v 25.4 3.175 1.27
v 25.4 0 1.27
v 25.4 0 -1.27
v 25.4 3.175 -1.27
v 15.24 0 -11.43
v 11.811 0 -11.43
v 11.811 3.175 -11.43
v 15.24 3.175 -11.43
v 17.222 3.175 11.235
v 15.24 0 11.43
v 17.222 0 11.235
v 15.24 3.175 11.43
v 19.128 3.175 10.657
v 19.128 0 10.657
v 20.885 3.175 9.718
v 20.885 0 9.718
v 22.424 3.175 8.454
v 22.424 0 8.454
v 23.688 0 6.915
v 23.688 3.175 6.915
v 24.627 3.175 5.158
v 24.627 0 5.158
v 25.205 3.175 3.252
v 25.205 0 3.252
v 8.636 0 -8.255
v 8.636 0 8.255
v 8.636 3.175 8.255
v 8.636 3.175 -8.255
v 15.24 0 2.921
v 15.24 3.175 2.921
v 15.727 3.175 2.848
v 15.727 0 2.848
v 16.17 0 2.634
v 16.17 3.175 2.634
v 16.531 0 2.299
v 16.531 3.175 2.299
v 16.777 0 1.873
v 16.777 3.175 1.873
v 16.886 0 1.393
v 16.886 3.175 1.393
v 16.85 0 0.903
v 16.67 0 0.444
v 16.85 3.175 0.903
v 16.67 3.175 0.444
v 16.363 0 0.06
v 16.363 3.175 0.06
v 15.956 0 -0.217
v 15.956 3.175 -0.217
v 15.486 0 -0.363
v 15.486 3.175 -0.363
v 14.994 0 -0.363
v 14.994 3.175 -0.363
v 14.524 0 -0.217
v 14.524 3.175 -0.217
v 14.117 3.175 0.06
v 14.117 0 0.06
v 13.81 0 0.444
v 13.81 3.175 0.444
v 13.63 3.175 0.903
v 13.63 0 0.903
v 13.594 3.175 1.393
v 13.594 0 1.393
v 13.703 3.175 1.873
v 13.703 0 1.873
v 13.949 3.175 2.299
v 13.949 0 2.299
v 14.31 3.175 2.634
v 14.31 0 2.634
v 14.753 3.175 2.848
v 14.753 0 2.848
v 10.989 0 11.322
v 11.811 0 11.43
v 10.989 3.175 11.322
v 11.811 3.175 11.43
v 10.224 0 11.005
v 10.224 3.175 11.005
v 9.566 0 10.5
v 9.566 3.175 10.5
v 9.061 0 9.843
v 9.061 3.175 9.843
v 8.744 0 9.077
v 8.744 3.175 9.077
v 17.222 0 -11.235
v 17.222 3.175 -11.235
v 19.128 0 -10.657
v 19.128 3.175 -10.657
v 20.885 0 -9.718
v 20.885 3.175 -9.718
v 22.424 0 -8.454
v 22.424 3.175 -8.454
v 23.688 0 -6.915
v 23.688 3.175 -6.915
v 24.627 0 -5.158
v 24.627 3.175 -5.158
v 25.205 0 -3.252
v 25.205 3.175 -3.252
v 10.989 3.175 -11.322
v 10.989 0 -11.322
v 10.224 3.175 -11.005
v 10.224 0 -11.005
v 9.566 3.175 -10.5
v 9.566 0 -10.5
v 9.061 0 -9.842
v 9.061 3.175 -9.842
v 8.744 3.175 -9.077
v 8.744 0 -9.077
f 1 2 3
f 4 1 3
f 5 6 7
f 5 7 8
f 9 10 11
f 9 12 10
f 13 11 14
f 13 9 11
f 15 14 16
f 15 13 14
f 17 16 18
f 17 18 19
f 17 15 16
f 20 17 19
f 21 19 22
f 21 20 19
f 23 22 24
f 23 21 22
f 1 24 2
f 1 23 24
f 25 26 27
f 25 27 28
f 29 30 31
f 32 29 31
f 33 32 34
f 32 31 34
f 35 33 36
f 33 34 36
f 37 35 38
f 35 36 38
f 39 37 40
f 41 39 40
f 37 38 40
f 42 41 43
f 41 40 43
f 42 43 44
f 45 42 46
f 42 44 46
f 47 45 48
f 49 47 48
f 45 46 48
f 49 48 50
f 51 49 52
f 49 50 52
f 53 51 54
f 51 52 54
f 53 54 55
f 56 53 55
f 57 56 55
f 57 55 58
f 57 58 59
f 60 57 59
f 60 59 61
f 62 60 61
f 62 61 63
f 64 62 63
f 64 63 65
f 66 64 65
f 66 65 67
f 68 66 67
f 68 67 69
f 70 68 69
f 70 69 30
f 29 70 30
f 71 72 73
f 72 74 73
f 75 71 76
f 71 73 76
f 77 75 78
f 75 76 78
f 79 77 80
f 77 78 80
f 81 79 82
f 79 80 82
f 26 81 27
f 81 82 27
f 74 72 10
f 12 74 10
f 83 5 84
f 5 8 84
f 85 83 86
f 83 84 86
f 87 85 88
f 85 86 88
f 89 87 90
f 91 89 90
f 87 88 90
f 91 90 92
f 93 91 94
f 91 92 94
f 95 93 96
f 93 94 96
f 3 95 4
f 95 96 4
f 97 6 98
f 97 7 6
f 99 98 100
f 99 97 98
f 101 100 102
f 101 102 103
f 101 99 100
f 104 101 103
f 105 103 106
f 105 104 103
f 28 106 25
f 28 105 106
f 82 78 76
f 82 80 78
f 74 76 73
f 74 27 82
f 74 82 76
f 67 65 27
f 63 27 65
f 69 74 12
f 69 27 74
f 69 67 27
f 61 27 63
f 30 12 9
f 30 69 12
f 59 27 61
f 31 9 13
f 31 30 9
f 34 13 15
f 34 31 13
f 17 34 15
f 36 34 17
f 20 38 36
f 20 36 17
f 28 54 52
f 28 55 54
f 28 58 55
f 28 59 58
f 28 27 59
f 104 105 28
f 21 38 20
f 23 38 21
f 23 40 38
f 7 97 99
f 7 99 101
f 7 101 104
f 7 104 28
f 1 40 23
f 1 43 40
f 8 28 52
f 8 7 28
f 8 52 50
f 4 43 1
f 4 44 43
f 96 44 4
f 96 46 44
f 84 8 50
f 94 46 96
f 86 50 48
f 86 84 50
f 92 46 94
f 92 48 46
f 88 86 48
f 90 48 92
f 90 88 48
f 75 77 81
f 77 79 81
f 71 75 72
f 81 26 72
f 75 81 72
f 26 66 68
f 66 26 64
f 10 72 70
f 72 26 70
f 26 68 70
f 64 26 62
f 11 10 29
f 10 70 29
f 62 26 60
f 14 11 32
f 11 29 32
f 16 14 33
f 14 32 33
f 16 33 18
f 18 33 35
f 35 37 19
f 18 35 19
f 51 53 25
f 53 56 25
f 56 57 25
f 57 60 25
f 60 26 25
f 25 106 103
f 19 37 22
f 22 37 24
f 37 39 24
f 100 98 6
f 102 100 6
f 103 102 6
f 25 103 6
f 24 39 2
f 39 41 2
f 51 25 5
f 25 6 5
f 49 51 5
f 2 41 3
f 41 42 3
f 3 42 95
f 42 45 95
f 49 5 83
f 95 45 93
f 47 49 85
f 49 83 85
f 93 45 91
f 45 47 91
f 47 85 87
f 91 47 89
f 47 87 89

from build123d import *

# Parameters (mm, degrees)
SKETCH1_W           = 50.8
SKETCH1_H           = 22.86
BOSS_EXTRUDE1_DEPTH = 3.175
FILLET1_R           = 10.16
SKETCH3_R           = 1.651
CUT_EXTRUDE1_DEPTH  = 29.033649869
FILLET3_R           = 10.16
SKETCH4_W           = 34.036
SKETCH4_H           = 22.86
CUT_EXTRUDE2_DEPTH  = 29.033649869
FILLET4_R           = 3.175


with BuildPart() as part:
    # Sketch1 → Boss-Extrude1 (new body)
    with BuildSketch(Plane(origin=(0, 0, 0), x_dir=(1, 0, 0), z_dir=(0, 1, 0))):
        Rectangle(SKETCH1_W, SKETCH1_H)
    extrude(amount=BOSS_EXTRUDE1_DEPTH)

    # Fillet1
    fillet1_edges = [part.edges().sort_by_distance(p)[0] for p in [
        (25.4, 1.5875, 11.43),
        (-25.4, 1.5875, 11.43),
    ]]
    fillet(fillet1_edges, radius=FILLET1_R)

    # Sketch3 → Cut-Extrude1 (cut, through all)
    with BuildSketch(Plane(origin=(0, 3.175, 0), x_dir=(1, 0, 0), z_dir=(0, 1, 0))):
        with Locations(Location((15.24, -1.27, 0), (0, 0, 270))):
            Circle(SKETCH3_R)
        with Locations(Location((-3.81, -1.27, 0), (0, 0, 270))):
            Circle(SKETCH3_R)
    extrude(amount=-CUT_EXTRUDE1_DEPTH, mode=Mode.SUBTRACT)

    # Fillet3
    fillet3_edges = [part.edges().sort_by_distance(p)[0] for p in [
        (-25.4, 1.5875, -11.43),
        (25.4, 1.5875, -11.43),
    ]]
    fillet(fillet3_edges, radius=FILLET3_R)

    # Sketch4 → Cut-Extrude2 (cut, through all)
    with BuildSketch(Plane(origin=(0, 0, 0), x_dir=(-1, 0, 0), z_dir=(0, -1, 0))):
        with Locations((8.382, 0)):
            Rectangle(SKETCH4_W, SKETCH4_H)
    extrude(amount=-CUT_EXTRUDE2_DEPTH, mode=Mode.SUBTRACT)

    # Fillet4
    fillet4_edges = [part.edges().sort_by_distance(p)[0] for p in [
        (8.636, 1.5875, -11.43),
        (8.636, 1.5875, 11.43),
    ]]
    fillet(fillet4_edges, radius=FILLET4_R)


solid = part.part
